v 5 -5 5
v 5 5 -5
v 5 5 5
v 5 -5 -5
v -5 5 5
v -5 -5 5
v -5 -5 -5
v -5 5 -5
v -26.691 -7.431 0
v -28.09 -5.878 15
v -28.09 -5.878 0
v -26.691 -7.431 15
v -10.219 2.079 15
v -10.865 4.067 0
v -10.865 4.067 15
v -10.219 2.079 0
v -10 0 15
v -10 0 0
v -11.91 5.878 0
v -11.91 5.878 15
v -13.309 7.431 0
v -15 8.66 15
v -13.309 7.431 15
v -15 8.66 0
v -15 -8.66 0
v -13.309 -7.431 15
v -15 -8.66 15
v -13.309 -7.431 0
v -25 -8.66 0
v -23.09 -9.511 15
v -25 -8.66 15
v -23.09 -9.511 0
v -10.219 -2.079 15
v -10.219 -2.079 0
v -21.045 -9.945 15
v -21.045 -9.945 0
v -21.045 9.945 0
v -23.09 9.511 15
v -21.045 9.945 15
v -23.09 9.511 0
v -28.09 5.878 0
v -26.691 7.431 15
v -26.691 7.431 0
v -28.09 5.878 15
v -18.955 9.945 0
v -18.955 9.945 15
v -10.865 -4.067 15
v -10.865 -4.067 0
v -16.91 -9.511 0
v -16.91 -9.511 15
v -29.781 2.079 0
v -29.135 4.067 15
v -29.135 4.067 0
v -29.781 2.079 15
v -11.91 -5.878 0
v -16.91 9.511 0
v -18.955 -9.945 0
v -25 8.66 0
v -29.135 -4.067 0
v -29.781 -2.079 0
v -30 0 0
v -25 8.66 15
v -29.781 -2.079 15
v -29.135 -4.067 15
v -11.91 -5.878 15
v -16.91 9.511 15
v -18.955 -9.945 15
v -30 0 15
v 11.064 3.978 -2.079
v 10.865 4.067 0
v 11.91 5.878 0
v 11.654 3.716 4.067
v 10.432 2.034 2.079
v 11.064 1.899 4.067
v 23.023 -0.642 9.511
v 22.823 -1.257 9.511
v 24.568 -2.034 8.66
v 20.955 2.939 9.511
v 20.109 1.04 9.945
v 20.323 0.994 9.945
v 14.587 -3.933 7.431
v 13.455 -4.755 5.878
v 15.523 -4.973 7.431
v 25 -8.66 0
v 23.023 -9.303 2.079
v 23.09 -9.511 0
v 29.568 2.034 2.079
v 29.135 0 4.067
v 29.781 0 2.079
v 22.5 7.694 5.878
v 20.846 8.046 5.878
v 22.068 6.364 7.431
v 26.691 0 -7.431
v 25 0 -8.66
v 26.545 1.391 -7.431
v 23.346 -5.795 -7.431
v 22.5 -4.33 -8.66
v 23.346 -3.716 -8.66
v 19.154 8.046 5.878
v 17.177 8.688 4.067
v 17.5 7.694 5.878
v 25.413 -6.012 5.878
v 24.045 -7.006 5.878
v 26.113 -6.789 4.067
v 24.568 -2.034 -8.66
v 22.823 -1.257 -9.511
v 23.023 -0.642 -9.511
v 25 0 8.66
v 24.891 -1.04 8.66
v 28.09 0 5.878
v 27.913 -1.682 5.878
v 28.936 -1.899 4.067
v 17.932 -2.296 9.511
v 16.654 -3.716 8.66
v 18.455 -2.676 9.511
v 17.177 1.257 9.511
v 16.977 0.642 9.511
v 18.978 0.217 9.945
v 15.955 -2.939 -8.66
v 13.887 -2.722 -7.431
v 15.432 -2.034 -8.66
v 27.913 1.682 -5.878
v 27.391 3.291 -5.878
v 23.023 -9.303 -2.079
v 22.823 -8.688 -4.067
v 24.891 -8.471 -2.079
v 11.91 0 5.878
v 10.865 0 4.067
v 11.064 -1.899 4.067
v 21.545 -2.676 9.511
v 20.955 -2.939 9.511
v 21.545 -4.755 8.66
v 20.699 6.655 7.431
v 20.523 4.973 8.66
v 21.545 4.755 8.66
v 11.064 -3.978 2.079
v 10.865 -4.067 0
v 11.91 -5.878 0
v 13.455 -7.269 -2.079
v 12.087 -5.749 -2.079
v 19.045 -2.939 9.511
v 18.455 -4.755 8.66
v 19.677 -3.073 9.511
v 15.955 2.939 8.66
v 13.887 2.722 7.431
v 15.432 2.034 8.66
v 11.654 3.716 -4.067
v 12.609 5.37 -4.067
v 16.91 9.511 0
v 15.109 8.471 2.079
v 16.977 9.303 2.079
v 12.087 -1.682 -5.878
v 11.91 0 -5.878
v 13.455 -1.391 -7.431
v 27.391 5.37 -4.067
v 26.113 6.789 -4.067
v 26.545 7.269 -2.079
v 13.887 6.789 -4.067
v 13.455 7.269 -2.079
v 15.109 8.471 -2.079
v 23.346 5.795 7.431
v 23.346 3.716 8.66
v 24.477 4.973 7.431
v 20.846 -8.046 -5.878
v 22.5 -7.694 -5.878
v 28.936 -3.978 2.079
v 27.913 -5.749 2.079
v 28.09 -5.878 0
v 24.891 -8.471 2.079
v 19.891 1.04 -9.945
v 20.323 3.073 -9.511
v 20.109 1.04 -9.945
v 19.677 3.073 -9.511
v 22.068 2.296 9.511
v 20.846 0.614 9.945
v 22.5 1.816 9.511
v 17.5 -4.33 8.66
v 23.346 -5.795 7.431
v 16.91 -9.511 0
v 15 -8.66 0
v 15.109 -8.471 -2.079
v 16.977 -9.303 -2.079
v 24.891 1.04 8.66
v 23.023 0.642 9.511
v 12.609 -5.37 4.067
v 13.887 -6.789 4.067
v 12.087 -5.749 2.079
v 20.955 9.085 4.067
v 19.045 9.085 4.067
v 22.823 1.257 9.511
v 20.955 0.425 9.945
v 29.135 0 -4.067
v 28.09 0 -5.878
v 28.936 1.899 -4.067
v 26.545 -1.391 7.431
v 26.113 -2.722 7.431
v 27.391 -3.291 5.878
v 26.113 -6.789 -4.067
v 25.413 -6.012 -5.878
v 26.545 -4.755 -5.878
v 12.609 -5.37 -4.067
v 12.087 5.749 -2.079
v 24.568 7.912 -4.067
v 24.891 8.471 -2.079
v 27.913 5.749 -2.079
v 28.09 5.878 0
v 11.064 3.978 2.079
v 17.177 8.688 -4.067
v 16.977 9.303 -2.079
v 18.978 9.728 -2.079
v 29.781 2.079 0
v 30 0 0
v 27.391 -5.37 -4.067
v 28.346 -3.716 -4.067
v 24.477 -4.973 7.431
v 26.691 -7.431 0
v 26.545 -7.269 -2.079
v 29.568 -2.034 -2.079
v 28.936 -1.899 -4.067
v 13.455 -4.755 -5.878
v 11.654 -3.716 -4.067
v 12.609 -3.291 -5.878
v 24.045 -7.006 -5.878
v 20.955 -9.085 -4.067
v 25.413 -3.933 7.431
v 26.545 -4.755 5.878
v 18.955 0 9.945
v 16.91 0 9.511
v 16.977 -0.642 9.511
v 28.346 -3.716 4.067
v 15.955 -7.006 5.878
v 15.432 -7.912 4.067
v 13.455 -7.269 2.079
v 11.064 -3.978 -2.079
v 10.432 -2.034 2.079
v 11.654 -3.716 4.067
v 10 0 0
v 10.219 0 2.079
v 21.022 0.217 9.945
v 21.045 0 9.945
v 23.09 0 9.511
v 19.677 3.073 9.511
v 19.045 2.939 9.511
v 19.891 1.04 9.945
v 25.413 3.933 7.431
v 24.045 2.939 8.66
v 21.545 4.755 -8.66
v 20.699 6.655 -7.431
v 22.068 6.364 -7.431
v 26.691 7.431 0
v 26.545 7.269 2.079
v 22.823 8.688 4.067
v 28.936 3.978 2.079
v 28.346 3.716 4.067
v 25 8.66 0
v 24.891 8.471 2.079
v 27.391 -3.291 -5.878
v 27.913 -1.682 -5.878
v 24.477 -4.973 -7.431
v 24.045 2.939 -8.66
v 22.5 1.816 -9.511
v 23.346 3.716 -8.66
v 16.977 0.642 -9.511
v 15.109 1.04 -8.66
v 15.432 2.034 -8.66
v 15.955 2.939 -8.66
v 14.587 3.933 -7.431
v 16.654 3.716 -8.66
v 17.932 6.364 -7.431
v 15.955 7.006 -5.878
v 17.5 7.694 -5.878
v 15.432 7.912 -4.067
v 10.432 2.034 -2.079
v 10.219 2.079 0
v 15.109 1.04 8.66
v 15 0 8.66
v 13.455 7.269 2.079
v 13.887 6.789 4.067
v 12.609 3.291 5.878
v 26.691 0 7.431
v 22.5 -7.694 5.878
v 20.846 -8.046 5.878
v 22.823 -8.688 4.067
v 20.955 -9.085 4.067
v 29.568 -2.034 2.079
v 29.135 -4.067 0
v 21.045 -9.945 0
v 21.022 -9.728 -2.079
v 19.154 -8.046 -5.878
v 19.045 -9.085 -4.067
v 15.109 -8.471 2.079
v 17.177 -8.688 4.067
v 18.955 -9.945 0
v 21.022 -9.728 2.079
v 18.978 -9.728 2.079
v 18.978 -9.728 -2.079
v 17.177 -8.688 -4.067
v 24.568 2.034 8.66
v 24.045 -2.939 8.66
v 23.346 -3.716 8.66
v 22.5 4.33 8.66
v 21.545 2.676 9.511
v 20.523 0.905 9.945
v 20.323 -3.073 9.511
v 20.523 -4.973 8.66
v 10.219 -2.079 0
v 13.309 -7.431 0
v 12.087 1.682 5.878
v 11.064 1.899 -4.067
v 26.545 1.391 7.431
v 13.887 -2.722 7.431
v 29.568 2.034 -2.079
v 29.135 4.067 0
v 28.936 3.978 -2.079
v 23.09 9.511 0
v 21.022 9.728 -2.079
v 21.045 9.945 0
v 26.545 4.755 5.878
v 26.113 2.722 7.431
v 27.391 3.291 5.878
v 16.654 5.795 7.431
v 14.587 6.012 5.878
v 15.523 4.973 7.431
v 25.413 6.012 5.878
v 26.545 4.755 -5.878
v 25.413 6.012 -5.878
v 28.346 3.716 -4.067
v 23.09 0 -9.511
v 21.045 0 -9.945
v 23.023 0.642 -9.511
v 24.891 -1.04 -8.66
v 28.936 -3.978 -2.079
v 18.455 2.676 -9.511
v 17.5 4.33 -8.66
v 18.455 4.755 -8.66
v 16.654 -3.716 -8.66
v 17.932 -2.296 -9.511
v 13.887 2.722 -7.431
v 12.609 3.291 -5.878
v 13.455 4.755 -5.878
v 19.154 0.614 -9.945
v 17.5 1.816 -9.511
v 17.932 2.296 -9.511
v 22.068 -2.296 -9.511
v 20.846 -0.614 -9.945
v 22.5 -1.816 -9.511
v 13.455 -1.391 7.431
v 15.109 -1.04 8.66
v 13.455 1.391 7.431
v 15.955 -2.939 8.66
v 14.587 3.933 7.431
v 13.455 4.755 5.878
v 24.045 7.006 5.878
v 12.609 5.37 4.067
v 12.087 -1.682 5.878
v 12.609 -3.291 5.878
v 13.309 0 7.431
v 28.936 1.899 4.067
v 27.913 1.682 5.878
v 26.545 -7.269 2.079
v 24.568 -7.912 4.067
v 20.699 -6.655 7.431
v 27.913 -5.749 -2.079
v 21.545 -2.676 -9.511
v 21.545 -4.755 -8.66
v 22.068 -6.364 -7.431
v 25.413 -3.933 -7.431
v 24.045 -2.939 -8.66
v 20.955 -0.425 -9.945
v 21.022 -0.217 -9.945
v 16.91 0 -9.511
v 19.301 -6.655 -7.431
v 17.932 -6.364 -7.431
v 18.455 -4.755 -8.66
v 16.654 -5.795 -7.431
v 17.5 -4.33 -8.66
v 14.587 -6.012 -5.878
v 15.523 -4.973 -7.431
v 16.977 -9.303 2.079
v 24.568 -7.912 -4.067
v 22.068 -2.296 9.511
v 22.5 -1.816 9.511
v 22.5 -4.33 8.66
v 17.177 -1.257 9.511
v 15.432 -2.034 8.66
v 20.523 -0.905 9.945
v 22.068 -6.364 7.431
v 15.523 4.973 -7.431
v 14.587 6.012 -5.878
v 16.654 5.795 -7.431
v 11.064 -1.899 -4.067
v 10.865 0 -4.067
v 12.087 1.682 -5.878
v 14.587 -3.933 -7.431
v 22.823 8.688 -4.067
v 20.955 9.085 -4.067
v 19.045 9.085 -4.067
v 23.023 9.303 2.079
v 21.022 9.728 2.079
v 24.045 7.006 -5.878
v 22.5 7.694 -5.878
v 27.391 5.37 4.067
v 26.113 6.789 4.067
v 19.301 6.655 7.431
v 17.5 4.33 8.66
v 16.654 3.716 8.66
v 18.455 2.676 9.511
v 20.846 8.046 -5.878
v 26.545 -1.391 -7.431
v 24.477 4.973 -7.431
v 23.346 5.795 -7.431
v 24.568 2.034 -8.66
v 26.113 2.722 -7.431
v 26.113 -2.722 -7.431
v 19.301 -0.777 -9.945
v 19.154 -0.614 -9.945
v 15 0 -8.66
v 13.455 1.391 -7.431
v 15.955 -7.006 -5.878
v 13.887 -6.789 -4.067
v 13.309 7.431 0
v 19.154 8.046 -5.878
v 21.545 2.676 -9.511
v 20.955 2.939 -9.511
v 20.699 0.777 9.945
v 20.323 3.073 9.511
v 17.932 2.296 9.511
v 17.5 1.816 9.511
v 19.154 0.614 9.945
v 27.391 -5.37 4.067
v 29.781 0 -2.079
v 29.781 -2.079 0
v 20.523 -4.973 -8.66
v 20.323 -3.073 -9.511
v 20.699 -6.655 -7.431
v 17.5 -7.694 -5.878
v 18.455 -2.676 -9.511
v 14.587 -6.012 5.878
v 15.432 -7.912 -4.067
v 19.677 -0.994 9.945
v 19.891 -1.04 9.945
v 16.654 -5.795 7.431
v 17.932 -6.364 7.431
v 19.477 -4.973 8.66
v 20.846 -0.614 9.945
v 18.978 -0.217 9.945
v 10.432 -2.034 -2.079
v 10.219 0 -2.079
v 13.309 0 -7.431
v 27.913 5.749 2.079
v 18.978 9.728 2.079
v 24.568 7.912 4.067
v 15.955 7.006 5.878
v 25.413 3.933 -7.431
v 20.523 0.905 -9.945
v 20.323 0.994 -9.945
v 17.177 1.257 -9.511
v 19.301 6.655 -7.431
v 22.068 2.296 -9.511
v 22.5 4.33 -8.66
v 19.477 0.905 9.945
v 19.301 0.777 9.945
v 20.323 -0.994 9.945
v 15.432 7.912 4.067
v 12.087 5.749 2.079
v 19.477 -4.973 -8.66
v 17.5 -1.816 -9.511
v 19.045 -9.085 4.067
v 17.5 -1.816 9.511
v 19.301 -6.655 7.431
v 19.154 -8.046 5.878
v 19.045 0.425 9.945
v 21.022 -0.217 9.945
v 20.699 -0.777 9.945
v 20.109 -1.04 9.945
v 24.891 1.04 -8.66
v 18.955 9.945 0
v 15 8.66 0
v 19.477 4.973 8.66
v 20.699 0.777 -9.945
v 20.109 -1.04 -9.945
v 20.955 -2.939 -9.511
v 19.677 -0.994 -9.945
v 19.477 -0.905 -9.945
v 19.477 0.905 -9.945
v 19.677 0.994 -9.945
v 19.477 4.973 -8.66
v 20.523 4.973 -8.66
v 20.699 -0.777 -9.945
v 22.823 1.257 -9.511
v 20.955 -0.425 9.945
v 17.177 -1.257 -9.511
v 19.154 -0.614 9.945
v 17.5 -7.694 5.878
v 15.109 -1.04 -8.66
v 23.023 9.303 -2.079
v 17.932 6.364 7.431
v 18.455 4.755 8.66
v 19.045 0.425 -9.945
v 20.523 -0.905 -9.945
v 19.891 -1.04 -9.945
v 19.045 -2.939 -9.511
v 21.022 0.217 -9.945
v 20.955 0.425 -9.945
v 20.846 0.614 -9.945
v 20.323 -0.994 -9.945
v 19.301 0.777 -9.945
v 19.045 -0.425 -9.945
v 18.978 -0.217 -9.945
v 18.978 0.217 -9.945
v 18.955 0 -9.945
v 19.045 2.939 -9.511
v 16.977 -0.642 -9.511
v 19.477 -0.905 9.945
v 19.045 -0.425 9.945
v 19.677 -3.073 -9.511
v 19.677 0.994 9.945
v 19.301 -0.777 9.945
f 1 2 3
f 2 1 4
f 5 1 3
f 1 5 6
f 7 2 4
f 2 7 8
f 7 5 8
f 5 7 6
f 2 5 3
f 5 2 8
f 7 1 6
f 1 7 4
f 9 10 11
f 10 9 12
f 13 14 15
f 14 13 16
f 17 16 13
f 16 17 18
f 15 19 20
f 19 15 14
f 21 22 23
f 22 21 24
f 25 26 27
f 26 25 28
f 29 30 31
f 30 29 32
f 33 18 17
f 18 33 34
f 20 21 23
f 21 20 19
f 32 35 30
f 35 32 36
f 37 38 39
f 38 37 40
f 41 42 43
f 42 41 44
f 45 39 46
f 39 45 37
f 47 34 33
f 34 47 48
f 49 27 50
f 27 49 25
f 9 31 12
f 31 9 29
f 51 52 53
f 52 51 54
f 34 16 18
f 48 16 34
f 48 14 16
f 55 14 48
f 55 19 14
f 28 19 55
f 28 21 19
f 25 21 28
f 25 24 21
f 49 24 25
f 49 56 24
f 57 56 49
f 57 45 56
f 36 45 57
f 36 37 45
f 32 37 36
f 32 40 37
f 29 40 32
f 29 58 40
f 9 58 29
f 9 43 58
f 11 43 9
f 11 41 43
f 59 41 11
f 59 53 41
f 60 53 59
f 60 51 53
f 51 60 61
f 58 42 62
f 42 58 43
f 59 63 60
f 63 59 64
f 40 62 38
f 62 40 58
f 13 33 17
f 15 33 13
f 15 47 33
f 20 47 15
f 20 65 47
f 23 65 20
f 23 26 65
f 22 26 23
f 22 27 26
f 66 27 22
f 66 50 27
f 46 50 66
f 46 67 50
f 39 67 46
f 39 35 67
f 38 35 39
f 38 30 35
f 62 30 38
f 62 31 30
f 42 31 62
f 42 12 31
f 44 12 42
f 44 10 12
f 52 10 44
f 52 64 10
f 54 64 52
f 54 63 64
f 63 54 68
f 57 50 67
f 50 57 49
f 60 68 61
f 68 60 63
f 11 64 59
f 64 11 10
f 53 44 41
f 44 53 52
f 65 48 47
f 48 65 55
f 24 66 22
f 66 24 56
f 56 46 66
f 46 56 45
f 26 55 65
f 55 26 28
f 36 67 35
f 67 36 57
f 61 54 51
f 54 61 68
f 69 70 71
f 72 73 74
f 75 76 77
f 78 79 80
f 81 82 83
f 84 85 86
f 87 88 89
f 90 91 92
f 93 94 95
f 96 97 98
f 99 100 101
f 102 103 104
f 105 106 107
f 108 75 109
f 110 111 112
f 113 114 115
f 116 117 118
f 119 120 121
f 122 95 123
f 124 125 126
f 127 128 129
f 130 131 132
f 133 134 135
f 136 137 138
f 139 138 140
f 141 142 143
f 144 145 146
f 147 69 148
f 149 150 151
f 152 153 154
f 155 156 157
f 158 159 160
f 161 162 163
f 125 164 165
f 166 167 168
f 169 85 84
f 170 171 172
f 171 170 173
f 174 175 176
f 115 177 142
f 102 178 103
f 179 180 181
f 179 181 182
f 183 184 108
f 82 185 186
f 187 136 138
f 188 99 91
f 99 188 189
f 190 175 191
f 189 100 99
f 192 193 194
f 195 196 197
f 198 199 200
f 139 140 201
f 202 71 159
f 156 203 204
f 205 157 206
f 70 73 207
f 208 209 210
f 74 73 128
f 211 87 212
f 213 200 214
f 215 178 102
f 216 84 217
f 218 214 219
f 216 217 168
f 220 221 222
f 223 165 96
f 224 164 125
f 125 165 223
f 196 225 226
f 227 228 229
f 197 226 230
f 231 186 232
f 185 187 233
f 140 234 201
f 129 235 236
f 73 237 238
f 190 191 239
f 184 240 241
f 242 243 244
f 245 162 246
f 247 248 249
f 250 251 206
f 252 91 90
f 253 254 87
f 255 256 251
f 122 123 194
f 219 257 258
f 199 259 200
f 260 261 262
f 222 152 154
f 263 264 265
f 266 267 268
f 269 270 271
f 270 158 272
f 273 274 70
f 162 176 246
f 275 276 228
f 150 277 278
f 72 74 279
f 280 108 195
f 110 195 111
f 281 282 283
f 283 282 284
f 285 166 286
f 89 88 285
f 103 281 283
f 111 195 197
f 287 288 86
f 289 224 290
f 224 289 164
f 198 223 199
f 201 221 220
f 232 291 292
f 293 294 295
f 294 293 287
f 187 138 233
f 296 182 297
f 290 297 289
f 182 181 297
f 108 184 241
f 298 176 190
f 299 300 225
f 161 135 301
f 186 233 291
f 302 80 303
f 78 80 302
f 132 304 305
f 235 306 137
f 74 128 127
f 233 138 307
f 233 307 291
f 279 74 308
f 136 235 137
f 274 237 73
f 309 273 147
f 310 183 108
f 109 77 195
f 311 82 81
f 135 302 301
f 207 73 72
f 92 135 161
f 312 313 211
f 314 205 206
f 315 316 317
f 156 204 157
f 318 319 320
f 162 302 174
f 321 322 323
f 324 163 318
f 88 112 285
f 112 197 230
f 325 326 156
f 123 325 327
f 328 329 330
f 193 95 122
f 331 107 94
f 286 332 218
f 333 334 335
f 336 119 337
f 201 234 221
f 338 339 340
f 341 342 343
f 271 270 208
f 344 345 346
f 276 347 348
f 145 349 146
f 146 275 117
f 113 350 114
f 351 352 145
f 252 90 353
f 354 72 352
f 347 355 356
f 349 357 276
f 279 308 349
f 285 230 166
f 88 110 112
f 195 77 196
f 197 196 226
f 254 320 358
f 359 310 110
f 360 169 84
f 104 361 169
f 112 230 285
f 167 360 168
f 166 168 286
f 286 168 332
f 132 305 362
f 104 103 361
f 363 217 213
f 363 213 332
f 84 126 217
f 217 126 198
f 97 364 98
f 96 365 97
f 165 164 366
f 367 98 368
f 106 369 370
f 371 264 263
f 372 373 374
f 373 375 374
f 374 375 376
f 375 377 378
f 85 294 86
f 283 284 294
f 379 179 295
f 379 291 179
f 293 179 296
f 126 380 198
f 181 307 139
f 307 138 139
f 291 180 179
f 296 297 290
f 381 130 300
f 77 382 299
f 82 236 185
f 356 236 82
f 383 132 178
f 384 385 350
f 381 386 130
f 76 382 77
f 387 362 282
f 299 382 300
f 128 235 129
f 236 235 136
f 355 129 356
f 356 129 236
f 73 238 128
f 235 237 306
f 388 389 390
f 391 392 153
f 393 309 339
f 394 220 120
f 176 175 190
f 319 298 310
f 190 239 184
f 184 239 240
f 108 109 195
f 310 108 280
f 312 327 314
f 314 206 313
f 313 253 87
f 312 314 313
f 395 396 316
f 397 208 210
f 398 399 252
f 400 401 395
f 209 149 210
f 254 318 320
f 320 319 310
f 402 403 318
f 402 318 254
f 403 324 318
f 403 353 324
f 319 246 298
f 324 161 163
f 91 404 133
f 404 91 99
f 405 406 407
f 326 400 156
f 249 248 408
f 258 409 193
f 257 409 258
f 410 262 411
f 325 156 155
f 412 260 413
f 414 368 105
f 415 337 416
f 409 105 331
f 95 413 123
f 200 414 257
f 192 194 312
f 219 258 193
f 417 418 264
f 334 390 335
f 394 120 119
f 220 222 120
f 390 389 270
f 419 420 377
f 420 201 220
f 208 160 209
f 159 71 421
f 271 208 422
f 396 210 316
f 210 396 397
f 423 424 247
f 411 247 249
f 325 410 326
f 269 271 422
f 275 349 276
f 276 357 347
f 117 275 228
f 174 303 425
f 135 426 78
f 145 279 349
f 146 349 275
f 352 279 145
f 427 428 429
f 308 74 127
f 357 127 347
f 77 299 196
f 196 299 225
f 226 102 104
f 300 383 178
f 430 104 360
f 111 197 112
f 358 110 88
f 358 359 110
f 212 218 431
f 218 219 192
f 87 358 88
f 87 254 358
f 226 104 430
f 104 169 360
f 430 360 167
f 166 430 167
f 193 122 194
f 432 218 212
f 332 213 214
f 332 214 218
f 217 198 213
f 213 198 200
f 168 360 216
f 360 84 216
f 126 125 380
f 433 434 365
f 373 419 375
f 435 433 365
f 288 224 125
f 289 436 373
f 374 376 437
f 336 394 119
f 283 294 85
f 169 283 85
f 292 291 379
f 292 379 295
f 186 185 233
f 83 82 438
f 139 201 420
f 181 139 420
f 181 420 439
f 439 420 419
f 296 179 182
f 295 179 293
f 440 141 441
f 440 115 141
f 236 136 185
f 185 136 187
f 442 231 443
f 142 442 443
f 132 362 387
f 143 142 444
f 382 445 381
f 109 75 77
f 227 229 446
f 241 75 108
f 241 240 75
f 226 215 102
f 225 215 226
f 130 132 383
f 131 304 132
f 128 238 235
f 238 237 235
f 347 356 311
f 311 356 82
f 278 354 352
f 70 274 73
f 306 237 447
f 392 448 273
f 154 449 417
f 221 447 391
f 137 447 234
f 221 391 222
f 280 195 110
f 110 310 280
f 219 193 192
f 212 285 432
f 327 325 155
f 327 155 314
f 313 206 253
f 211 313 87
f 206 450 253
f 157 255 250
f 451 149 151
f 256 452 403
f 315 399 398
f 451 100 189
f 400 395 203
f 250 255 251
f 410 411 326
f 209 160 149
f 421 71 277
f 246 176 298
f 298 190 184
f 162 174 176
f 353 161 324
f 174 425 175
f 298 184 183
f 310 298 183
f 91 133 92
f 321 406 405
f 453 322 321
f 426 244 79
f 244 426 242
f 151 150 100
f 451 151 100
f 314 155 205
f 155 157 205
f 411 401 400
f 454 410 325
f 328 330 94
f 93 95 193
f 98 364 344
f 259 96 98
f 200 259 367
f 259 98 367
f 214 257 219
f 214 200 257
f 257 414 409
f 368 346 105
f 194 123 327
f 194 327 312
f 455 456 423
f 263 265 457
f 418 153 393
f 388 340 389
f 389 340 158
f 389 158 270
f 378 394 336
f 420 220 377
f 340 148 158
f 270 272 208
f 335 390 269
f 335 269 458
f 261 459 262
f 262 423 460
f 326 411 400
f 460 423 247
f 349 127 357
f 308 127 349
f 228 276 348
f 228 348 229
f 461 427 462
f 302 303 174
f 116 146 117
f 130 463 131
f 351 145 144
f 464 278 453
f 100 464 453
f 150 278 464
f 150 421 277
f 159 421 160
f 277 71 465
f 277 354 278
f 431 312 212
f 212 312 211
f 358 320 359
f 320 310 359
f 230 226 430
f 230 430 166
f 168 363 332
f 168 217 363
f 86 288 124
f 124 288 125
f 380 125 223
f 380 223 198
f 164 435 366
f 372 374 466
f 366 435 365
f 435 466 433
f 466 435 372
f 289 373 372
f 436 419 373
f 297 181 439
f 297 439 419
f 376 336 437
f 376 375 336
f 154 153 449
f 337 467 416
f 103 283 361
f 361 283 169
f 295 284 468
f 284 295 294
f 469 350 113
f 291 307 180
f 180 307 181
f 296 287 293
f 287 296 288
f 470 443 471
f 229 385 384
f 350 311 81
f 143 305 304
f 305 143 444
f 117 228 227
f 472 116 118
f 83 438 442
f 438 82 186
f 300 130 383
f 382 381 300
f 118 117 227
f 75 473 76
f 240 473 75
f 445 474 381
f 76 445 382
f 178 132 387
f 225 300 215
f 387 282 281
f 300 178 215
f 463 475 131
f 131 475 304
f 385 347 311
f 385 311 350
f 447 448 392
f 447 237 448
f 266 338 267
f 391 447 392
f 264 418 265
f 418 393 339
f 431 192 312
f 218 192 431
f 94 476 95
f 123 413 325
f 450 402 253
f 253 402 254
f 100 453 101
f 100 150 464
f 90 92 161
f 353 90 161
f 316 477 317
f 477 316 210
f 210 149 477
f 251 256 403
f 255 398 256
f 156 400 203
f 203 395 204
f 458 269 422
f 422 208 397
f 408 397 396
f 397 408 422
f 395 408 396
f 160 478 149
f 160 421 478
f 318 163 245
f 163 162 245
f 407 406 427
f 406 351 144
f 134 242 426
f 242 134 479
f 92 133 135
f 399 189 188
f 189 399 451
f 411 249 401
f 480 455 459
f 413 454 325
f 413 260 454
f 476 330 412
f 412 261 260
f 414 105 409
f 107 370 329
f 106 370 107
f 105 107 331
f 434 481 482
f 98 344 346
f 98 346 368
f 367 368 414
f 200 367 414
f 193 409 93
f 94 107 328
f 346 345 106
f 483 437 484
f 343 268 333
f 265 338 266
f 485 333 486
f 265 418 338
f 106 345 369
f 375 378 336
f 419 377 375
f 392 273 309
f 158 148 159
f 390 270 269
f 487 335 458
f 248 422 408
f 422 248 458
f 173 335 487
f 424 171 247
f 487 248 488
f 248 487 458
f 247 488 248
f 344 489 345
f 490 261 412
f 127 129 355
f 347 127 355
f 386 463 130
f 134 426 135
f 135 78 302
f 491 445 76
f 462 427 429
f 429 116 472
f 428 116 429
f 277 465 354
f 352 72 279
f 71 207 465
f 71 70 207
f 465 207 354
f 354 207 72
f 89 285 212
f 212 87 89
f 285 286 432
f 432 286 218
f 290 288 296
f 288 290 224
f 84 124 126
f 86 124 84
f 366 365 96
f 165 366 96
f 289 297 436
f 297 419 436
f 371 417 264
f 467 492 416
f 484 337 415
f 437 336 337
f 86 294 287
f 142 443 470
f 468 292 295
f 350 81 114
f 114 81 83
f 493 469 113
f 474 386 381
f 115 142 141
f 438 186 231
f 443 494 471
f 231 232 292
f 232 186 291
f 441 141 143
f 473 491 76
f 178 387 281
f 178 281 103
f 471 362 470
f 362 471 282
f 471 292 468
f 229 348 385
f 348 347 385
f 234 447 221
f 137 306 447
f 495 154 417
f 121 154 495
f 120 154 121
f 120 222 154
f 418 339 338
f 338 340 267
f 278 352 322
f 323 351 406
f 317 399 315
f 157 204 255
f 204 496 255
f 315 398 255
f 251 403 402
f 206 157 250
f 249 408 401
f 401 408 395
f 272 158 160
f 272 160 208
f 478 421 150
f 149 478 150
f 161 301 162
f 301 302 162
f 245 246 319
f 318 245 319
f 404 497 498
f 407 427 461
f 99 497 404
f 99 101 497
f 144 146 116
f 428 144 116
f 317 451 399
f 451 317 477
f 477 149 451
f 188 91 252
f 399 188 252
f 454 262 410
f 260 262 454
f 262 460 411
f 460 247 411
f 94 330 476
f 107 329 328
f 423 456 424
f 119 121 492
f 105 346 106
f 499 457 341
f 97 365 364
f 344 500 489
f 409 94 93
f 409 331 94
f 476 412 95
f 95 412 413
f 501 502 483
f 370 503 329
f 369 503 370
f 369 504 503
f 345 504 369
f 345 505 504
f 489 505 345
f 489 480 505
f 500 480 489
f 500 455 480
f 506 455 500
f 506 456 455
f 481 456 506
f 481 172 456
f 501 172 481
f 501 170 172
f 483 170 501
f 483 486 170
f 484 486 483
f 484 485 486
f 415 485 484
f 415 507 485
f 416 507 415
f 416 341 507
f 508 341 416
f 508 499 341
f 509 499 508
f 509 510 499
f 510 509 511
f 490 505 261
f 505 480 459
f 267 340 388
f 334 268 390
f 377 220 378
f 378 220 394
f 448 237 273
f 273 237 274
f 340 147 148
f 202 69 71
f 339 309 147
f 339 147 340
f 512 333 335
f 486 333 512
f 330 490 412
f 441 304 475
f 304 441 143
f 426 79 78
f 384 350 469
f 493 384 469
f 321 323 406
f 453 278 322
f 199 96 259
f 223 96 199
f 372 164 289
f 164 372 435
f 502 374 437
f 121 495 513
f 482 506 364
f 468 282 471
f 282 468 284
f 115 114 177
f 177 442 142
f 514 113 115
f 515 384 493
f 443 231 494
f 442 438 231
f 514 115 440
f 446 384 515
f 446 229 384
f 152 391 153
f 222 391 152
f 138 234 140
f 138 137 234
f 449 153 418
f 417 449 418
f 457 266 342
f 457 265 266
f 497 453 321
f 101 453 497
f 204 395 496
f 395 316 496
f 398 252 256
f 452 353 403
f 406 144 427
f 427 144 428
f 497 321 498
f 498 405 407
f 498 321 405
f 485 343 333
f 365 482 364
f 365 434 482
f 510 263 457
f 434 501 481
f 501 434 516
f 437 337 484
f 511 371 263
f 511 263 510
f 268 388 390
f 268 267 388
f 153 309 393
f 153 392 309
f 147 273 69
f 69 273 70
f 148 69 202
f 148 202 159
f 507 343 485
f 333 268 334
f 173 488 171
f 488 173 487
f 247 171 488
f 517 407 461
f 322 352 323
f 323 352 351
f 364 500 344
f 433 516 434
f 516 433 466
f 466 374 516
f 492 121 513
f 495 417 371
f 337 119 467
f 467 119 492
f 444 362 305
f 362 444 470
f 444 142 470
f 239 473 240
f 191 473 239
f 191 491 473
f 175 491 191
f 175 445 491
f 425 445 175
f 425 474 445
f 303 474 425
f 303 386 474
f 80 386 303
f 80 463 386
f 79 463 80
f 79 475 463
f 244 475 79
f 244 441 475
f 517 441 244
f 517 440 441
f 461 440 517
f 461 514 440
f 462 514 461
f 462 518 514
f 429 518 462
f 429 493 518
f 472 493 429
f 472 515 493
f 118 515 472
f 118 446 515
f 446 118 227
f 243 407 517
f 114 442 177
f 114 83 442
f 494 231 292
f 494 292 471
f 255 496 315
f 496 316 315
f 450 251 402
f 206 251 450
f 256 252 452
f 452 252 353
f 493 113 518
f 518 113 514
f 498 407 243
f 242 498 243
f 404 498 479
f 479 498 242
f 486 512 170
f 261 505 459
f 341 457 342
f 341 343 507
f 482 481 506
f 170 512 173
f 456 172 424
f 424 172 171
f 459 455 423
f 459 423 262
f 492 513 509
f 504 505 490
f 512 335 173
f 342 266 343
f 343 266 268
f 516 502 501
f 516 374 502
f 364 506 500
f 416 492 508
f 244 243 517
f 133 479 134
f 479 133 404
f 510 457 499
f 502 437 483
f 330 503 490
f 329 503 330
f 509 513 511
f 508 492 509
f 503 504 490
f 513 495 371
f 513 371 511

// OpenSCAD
cube(10,center=true);

translate([-20,0,0])
cylinder(r=10,h=15);

translate([20,0,0])
sphere(r=10,center=true);
